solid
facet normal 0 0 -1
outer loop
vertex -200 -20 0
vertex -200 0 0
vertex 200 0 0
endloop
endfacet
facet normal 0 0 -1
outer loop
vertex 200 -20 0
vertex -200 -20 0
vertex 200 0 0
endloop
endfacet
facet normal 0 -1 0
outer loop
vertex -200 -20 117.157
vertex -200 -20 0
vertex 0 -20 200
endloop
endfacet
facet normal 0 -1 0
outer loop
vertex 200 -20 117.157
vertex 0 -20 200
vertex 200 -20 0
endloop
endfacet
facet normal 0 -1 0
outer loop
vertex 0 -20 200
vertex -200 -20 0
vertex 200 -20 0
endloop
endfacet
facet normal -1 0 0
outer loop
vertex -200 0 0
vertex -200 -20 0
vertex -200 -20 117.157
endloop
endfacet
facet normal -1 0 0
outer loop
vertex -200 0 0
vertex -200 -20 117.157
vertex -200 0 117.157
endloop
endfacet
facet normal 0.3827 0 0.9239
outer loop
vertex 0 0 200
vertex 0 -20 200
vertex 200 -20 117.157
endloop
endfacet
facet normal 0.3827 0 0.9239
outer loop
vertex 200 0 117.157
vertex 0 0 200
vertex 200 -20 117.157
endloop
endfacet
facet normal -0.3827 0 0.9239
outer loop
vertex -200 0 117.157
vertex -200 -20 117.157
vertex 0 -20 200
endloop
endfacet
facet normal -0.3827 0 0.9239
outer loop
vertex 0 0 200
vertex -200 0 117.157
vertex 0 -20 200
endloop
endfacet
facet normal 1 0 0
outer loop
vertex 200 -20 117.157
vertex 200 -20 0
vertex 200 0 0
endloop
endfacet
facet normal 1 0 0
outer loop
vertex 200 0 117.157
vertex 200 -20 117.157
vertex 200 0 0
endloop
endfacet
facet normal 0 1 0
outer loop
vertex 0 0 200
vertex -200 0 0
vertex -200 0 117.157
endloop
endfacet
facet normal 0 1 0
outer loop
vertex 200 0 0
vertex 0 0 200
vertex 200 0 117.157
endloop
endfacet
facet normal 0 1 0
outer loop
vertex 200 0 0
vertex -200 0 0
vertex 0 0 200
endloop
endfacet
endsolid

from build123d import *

# Parameters (mm, degrees)
F0_W     = 400
F0_H     = 20
F1_DEPTH = 200
F4_DEPTH = 20.001
F6_DEPTH = 20.001


with BuildPart() as f1:
    # F0 (on Top) → F1 (new body)
    with BuildSketch(Plane.XY):
        with Locations((0, -10)):
            Rectangle(F0_W, F0_H)
    extrude(amount=F1_DEPTH)

    # F3 (on face) → F4 (cut, through all)
    with BuildSketch(Plane.XZ.offset(20)):
        Polygon((-200, 117.157288), (0, 200), (-200, 200), align=None)
    extrude(amount=-F4_DEPTH, mode=Mode.SUBTRACT)

    # F5 (on face) → F6 (cut, through all)
    with BuildSketch(Plane.XZ.offset(20)):
        Polygon((200, 200), (0, 200), (200, 117.157288), align=None)
    extrude(amount=-F6_DEPTH, mode=Mode.SUBTRACT)


solid = f1.part
